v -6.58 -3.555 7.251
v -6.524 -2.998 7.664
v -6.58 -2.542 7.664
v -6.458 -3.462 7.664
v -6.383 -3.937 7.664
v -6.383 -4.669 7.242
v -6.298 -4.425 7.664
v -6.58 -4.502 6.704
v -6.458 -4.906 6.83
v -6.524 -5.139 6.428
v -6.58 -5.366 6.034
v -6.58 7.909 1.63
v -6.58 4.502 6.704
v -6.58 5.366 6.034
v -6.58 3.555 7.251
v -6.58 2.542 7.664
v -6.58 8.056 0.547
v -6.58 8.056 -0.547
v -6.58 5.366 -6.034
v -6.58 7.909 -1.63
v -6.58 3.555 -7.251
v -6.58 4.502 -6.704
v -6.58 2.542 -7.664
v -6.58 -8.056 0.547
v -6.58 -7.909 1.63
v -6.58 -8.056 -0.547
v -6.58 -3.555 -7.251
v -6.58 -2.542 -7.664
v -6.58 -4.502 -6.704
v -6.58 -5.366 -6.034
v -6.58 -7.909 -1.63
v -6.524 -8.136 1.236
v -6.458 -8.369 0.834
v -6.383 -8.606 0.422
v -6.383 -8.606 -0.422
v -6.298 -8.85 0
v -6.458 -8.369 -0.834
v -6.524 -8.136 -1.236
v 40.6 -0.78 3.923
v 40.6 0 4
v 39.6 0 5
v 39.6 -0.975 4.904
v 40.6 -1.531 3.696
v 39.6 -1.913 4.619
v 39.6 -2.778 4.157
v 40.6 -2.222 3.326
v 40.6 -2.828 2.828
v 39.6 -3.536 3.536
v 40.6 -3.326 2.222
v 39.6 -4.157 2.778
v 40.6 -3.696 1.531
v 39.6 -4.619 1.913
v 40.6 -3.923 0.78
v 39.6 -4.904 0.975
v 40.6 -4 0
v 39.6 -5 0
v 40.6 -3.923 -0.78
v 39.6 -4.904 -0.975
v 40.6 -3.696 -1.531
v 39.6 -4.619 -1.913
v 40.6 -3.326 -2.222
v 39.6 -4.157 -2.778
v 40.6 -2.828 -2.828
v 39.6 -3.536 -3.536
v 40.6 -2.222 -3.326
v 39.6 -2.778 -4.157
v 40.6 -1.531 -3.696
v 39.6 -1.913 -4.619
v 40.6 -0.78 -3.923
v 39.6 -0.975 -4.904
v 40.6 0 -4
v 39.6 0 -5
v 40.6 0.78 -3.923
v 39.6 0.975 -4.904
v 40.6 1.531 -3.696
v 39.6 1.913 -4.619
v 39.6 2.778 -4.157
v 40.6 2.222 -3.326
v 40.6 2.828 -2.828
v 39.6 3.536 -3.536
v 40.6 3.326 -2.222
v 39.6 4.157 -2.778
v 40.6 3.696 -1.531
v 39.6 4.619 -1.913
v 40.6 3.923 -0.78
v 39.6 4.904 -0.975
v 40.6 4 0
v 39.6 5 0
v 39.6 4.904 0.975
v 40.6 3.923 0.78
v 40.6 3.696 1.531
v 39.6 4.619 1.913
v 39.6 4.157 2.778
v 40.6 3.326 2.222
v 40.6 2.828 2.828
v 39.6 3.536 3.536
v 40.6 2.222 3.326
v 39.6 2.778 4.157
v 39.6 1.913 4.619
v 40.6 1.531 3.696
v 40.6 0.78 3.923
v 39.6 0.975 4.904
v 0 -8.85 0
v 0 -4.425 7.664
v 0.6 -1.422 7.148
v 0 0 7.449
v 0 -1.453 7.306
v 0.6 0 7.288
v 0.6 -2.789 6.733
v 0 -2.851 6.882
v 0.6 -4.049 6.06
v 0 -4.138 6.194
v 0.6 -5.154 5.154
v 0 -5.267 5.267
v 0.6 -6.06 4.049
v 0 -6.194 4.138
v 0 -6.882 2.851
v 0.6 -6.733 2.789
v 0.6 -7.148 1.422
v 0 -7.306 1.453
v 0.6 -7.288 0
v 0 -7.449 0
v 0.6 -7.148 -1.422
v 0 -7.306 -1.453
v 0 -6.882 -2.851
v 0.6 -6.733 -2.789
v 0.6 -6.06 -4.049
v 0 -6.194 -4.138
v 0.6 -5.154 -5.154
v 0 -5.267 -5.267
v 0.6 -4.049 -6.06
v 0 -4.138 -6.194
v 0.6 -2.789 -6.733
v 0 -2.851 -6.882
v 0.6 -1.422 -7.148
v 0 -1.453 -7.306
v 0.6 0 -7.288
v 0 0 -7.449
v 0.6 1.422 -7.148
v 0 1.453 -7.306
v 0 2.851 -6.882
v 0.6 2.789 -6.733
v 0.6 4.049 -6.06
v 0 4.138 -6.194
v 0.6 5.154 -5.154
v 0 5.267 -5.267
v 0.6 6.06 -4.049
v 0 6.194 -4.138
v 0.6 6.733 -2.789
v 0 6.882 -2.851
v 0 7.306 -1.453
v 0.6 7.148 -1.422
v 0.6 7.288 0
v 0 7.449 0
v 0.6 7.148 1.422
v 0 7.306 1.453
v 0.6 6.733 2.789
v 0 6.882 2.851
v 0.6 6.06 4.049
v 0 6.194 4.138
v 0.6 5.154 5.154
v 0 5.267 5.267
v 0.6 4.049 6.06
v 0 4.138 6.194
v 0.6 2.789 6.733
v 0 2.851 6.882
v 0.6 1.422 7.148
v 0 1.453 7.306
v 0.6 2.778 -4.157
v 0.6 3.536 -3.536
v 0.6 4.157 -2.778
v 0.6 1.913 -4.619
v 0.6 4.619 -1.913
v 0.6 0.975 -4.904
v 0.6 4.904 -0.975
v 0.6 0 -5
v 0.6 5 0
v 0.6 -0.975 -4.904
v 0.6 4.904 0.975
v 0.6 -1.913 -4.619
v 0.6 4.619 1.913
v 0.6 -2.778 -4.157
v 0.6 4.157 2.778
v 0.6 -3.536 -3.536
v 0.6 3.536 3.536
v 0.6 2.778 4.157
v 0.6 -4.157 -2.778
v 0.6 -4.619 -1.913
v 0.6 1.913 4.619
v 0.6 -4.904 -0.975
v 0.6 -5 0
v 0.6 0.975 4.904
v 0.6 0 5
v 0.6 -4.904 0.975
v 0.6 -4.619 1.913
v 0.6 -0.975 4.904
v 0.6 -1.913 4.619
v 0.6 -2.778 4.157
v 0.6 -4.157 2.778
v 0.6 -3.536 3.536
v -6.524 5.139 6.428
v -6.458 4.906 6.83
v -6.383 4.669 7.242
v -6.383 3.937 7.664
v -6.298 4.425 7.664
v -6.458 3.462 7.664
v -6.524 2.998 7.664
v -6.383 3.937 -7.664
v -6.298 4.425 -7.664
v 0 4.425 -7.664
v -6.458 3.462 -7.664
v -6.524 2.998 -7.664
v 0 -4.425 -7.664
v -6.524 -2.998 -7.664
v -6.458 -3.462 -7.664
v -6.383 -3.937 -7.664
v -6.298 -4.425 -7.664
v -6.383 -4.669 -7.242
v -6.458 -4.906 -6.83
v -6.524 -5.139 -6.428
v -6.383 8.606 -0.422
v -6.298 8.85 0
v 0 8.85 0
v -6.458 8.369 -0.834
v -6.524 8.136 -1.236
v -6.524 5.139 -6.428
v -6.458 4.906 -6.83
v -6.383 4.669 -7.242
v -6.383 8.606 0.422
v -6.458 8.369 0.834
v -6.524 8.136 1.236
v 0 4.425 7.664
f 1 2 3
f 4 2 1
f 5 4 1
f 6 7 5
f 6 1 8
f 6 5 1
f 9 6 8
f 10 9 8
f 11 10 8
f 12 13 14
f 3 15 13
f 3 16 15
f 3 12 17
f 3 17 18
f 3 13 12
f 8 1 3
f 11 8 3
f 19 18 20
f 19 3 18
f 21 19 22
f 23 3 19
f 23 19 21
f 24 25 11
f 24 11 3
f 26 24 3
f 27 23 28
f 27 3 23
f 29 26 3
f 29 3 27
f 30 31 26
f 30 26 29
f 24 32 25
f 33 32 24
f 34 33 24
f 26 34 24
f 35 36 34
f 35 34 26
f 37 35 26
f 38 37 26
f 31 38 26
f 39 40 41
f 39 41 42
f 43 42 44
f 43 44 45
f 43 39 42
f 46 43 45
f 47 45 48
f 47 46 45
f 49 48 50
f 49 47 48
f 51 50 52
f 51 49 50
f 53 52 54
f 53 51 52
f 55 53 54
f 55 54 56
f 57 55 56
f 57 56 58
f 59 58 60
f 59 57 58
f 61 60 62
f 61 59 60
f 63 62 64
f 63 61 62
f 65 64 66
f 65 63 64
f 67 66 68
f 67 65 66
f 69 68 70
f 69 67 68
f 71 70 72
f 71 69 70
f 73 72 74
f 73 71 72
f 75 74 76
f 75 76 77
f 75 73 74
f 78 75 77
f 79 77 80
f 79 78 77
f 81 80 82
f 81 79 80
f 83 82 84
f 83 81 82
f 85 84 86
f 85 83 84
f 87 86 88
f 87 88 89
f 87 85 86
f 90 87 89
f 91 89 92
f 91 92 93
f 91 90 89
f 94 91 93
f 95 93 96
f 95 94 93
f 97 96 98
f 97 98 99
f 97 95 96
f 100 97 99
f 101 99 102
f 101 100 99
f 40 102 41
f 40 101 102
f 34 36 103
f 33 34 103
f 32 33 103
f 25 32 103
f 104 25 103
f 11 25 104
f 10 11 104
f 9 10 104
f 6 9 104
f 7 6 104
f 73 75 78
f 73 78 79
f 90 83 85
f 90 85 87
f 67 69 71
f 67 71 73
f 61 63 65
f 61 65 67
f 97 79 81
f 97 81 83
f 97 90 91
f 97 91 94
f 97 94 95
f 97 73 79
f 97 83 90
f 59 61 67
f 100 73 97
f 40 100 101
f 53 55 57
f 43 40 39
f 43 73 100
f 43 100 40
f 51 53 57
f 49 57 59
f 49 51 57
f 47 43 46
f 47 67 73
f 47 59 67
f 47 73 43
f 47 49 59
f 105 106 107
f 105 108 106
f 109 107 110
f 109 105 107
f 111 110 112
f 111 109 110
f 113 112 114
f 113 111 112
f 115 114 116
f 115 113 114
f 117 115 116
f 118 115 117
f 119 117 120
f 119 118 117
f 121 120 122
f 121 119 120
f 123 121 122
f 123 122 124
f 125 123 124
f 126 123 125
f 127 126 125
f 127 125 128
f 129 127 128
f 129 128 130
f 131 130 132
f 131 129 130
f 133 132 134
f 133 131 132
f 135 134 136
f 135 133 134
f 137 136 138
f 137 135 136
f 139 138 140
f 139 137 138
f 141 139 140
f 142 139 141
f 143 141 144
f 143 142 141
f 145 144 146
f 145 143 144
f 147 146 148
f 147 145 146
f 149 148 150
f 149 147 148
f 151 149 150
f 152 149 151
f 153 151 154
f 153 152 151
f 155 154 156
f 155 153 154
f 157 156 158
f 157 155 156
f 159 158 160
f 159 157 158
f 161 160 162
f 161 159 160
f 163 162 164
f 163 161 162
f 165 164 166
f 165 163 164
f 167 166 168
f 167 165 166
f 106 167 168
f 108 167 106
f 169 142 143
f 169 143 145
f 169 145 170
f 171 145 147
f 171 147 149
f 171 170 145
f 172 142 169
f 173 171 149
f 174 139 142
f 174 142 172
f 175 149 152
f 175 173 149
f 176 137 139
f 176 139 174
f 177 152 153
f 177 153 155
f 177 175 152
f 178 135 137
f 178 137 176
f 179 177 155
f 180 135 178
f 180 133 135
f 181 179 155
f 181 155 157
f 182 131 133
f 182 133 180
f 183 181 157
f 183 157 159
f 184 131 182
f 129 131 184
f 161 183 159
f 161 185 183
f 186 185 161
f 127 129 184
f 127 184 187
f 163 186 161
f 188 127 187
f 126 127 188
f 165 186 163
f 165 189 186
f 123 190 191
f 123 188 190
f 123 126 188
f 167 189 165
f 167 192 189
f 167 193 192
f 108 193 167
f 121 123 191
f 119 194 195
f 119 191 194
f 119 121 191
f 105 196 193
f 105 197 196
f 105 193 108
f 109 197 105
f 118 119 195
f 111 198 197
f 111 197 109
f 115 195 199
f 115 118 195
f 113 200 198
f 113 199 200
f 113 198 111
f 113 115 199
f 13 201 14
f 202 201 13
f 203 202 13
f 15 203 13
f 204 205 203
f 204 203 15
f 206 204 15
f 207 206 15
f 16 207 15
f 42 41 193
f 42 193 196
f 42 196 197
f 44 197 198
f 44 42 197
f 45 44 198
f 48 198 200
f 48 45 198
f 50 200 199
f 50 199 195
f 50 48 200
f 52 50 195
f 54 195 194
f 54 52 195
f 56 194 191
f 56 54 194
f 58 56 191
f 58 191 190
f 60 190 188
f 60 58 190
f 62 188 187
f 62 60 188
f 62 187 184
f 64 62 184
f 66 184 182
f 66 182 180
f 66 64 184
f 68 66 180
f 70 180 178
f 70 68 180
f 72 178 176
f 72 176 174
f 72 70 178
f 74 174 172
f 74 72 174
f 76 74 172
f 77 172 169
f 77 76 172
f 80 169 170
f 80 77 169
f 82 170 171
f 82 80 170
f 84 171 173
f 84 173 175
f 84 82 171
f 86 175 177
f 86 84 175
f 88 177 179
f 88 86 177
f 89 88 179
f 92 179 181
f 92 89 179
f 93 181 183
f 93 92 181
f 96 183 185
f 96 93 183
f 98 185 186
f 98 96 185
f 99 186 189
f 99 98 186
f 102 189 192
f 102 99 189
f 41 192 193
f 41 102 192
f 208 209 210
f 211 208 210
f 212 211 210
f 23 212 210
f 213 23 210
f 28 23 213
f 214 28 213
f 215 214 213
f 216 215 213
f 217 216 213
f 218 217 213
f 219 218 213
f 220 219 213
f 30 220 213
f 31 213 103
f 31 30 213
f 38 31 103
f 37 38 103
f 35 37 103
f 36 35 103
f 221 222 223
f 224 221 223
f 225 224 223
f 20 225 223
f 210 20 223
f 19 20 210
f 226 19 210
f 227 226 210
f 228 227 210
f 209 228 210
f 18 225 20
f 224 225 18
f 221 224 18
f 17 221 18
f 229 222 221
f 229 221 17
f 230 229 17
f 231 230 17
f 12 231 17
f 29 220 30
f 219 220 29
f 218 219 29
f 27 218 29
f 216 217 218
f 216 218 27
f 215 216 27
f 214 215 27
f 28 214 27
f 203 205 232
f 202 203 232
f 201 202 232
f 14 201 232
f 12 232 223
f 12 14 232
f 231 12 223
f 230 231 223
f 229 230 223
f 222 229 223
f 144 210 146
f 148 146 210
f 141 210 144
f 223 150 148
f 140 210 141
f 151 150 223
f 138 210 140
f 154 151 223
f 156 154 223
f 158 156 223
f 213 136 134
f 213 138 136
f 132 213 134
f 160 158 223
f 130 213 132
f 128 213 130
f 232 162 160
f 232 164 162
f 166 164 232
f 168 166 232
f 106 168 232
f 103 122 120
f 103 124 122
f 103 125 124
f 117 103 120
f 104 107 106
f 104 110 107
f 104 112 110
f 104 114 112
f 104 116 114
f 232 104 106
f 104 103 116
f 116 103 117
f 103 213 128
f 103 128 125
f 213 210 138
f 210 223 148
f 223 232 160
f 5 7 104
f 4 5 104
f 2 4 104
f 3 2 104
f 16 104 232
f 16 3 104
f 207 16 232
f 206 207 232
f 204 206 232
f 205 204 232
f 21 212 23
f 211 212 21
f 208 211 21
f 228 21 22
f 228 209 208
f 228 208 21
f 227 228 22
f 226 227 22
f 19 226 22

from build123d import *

# Parameters (mm, degrees)
SKETCH_2_OUTSIDE_W  = 30.382
SKETCH_2_OUTSIDE_H  = 30.382
CUT_EXTRUDE_1_DEPTH = 49.811857166
CHAMFER_1_SIZE      = 1


with BuildPart() as part:
    # Эскиз1 → Повернуть1 (revolve)
    with BuildSketch(Plane.XY, mode=Mode.PRIVATE) as revolve_1_sk:
        Polygon((-6.58, 0), (-6.58, 8.85), (0, 8.85), (0, 7.448974596), (0.6, 7.288205081), (0.6, 5), (40.6, 5), (40.6, 0), align=None)
    revolve(revolve_1_sk.sketch.rotate(Axis((-1000, 0, 0), (1, 0, 0)), 90), axis=Axis((-1000, 0, 0), (1, 0, 0)))

    # Эскиз2 outside → Вырез-Вытянуть1 (cut, through all)
    with BuildSketch(Plane.ZY.offset(6.58)):
        Rectangle(SKETCH_2_OUTSIDE_W, SKETCH_2_OUTSIDE_H)
        Polygon((0, -8.85), (7.664324823, -4.425), (7.664324823, 4.425), (0, 8.85), (-7.664324823, 4.425), (-7.664324823, -4.425), align=None, mode=Mode.SUBTRACT)
    extrude(amount=-CUT_EXTRUDE_1_DEPTH, mode=Mode.SUBTRACT)

    # Эскиз4 → Вырез-Повернуть1 (revolve, cut)
    with BuildSketch(Plane.XY):
        Polygon((-6.58, 8.075), (-6.297923068, 8.85), (-6.58, 8.85), align=None)
    revolve(axis=Axis((-1000, 0, 0), (1, 0, 0)), mode=Mode.SUBTRACT)

    # Фаска1
    chamfer_1_edges = [part.edges().sort_by_distance(p)[0] for p in [
        (40.6, 0, -5),
    ]]
    chamfer(chamfer_1_edges, length=CHAMFER_1_SIZE)


solid = part.part
